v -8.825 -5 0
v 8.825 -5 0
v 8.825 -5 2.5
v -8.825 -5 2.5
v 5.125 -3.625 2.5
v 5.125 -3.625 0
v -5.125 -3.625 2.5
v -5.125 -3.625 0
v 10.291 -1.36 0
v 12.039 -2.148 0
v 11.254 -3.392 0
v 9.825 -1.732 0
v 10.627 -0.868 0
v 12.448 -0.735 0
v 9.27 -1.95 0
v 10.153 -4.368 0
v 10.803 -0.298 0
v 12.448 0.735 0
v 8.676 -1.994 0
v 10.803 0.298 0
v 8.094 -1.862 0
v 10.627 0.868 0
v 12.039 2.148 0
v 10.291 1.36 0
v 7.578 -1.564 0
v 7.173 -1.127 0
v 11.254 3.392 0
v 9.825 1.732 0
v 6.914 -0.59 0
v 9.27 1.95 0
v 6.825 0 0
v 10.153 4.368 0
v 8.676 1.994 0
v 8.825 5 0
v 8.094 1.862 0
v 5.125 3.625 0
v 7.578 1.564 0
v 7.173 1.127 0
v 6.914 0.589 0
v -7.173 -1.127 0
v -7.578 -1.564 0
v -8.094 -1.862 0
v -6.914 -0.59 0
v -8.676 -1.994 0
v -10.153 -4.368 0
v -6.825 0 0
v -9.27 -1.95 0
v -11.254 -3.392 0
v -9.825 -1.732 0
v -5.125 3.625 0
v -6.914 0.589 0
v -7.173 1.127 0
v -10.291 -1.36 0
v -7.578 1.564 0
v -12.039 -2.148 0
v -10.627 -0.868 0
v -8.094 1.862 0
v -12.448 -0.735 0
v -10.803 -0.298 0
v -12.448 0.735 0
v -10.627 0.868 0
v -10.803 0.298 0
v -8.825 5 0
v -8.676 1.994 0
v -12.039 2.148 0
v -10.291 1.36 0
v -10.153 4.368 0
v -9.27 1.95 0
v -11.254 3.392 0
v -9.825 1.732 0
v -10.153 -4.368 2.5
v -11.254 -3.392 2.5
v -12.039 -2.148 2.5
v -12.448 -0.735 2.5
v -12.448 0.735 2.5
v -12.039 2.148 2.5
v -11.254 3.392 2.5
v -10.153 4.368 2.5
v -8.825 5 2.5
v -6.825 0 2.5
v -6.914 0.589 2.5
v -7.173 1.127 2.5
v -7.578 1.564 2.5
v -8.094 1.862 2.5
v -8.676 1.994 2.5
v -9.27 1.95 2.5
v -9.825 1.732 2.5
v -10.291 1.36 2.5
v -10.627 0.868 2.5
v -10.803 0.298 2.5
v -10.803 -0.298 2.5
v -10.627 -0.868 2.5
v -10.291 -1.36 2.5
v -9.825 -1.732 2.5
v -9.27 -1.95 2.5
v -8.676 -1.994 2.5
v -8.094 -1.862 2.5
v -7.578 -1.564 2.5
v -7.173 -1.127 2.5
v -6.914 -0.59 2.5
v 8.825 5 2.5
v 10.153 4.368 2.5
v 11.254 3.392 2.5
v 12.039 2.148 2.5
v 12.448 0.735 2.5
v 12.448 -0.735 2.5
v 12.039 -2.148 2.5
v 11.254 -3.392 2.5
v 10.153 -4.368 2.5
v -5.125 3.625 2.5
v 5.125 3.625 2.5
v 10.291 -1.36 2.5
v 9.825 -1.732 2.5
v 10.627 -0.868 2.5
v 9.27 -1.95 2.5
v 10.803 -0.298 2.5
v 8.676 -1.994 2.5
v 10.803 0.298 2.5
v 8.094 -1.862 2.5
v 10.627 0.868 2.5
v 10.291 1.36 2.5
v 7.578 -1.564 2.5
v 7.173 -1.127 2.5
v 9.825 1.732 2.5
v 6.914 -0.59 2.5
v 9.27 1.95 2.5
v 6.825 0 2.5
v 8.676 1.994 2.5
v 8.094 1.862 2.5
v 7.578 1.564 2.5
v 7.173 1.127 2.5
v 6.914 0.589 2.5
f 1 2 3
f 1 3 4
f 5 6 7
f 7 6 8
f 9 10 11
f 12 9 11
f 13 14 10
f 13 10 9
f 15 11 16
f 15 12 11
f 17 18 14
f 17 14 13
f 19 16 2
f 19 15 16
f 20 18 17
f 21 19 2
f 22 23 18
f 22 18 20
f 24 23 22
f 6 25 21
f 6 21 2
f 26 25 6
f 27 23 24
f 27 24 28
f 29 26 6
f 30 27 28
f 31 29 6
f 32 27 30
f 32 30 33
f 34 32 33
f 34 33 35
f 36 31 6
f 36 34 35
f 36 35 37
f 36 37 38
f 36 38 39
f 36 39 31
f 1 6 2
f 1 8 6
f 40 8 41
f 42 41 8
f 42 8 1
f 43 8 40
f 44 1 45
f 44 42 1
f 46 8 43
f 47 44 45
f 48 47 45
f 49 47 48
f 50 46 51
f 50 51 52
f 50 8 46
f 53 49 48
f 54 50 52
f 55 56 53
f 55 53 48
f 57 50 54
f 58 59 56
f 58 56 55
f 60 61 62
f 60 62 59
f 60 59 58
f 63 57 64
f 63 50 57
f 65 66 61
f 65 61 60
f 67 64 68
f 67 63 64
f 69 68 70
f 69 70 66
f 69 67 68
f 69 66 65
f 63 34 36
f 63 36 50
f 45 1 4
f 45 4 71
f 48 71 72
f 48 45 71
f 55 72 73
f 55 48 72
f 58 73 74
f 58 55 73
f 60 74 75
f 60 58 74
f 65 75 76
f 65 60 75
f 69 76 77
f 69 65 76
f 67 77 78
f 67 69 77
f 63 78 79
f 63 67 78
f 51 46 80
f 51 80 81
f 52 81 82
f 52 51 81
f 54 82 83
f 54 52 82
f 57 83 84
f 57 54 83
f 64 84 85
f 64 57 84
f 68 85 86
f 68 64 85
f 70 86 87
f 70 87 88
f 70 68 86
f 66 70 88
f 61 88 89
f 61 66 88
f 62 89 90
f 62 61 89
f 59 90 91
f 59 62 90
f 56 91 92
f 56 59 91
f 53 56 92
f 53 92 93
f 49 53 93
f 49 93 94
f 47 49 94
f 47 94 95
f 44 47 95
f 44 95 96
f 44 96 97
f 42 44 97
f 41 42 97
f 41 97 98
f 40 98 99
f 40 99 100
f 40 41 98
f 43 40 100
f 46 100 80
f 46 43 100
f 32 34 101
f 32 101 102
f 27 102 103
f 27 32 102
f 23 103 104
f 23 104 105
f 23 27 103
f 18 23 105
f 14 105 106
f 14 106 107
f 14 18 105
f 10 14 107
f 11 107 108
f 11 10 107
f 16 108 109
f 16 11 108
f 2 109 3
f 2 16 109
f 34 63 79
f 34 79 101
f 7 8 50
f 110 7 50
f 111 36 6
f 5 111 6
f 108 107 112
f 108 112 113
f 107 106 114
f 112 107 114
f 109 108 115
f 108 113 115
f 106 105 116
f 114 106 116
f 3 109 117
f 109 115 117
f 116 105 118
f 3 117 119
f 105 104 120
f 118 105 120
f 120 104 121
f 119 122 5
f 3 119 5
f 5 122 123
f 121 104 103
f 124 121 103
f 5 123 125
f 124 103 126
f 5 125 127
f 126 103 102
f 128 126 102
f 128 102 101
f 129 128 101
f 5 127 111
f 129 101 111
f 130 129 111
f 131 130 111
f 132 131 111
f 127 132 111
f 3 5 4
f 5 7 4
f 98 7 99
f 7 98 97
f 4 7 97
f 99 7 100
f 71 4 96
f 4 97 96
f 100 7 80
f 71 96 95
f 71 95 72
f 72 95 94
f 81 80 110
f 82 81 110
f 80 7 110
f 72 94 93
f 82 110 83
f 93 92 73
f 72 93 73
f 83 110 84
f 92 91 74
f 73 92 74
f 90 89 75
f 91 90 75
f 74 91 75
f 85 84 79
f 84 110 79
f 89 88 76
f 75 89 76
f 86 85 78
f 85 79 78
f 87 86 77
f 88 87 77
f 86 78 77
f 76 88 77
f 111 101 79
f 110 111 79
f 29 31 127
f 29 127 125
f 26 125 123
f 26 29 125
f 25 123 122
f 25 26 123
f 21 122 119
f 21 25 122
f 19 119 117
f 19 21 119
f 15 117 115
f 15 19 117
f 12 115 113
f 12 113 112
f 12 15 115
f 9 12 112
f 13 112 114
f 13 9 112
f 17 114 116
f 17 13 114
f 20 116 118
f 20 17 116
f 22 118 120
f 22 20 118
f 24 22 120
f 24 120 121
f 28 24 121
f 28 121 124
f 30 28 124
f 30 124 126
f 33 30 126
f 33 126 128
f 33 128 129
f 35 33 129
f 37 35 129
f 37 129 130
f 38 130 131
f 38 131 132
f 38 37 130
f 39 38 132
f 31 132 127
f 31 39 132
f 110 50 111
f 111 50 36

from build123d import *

# Parameters (mm, degrees)
SKETCH2_R           = 2
BOSS_EXTRUDE1_DEPTH = 2.5


with BuildPart() as part:
    # Sketch2 → Boss-Extrude1 (new body)
    with BuildSketch(Plane.XY):
        with BuildLine():
            Line((-8.825, 5.0000164), (8.825, 5.0000164))
            ThreePointArc((8.825, 5.0000164), (12.499924895, -2.3221e-05), (8.825, -5.000062843))
            Line((8.825, -5.000062843), (-8.825, -5.000062843))
            ThreePointArc((-8.825, -5.000062843), (-12.499924895, -2.3221e-05), (-8.825, 5.0000164))
        make_face()
        with Locations((-8.825, -2.3221e-05)):
            Circle(SKETCH2_R, mode=Mode.SUBTRACT)
        with Locations(Location((8.825, -2.3221e-05, 0), (0, 0, 180))):
            Circle(SKETCH2_R, mode=Mode.SUBTRACT)
        Polygon((-5.125, -2.725), (-5.125, 2.725), (-5.125, 3.625), (-3.085, 3.625), (3.085, 3.625), (5.125, 3.625), (5.125, 2.725), (5.125, -2.725), (5.125, -3.625), (3.085, -3.625), (-3.085, -3.625), (-5.125, -3.625), align=None, mode=Mode.SUBTRACT)
    extrude(amount=BOSS_EXTRUDE1_DEPTH)


solid = part.part
